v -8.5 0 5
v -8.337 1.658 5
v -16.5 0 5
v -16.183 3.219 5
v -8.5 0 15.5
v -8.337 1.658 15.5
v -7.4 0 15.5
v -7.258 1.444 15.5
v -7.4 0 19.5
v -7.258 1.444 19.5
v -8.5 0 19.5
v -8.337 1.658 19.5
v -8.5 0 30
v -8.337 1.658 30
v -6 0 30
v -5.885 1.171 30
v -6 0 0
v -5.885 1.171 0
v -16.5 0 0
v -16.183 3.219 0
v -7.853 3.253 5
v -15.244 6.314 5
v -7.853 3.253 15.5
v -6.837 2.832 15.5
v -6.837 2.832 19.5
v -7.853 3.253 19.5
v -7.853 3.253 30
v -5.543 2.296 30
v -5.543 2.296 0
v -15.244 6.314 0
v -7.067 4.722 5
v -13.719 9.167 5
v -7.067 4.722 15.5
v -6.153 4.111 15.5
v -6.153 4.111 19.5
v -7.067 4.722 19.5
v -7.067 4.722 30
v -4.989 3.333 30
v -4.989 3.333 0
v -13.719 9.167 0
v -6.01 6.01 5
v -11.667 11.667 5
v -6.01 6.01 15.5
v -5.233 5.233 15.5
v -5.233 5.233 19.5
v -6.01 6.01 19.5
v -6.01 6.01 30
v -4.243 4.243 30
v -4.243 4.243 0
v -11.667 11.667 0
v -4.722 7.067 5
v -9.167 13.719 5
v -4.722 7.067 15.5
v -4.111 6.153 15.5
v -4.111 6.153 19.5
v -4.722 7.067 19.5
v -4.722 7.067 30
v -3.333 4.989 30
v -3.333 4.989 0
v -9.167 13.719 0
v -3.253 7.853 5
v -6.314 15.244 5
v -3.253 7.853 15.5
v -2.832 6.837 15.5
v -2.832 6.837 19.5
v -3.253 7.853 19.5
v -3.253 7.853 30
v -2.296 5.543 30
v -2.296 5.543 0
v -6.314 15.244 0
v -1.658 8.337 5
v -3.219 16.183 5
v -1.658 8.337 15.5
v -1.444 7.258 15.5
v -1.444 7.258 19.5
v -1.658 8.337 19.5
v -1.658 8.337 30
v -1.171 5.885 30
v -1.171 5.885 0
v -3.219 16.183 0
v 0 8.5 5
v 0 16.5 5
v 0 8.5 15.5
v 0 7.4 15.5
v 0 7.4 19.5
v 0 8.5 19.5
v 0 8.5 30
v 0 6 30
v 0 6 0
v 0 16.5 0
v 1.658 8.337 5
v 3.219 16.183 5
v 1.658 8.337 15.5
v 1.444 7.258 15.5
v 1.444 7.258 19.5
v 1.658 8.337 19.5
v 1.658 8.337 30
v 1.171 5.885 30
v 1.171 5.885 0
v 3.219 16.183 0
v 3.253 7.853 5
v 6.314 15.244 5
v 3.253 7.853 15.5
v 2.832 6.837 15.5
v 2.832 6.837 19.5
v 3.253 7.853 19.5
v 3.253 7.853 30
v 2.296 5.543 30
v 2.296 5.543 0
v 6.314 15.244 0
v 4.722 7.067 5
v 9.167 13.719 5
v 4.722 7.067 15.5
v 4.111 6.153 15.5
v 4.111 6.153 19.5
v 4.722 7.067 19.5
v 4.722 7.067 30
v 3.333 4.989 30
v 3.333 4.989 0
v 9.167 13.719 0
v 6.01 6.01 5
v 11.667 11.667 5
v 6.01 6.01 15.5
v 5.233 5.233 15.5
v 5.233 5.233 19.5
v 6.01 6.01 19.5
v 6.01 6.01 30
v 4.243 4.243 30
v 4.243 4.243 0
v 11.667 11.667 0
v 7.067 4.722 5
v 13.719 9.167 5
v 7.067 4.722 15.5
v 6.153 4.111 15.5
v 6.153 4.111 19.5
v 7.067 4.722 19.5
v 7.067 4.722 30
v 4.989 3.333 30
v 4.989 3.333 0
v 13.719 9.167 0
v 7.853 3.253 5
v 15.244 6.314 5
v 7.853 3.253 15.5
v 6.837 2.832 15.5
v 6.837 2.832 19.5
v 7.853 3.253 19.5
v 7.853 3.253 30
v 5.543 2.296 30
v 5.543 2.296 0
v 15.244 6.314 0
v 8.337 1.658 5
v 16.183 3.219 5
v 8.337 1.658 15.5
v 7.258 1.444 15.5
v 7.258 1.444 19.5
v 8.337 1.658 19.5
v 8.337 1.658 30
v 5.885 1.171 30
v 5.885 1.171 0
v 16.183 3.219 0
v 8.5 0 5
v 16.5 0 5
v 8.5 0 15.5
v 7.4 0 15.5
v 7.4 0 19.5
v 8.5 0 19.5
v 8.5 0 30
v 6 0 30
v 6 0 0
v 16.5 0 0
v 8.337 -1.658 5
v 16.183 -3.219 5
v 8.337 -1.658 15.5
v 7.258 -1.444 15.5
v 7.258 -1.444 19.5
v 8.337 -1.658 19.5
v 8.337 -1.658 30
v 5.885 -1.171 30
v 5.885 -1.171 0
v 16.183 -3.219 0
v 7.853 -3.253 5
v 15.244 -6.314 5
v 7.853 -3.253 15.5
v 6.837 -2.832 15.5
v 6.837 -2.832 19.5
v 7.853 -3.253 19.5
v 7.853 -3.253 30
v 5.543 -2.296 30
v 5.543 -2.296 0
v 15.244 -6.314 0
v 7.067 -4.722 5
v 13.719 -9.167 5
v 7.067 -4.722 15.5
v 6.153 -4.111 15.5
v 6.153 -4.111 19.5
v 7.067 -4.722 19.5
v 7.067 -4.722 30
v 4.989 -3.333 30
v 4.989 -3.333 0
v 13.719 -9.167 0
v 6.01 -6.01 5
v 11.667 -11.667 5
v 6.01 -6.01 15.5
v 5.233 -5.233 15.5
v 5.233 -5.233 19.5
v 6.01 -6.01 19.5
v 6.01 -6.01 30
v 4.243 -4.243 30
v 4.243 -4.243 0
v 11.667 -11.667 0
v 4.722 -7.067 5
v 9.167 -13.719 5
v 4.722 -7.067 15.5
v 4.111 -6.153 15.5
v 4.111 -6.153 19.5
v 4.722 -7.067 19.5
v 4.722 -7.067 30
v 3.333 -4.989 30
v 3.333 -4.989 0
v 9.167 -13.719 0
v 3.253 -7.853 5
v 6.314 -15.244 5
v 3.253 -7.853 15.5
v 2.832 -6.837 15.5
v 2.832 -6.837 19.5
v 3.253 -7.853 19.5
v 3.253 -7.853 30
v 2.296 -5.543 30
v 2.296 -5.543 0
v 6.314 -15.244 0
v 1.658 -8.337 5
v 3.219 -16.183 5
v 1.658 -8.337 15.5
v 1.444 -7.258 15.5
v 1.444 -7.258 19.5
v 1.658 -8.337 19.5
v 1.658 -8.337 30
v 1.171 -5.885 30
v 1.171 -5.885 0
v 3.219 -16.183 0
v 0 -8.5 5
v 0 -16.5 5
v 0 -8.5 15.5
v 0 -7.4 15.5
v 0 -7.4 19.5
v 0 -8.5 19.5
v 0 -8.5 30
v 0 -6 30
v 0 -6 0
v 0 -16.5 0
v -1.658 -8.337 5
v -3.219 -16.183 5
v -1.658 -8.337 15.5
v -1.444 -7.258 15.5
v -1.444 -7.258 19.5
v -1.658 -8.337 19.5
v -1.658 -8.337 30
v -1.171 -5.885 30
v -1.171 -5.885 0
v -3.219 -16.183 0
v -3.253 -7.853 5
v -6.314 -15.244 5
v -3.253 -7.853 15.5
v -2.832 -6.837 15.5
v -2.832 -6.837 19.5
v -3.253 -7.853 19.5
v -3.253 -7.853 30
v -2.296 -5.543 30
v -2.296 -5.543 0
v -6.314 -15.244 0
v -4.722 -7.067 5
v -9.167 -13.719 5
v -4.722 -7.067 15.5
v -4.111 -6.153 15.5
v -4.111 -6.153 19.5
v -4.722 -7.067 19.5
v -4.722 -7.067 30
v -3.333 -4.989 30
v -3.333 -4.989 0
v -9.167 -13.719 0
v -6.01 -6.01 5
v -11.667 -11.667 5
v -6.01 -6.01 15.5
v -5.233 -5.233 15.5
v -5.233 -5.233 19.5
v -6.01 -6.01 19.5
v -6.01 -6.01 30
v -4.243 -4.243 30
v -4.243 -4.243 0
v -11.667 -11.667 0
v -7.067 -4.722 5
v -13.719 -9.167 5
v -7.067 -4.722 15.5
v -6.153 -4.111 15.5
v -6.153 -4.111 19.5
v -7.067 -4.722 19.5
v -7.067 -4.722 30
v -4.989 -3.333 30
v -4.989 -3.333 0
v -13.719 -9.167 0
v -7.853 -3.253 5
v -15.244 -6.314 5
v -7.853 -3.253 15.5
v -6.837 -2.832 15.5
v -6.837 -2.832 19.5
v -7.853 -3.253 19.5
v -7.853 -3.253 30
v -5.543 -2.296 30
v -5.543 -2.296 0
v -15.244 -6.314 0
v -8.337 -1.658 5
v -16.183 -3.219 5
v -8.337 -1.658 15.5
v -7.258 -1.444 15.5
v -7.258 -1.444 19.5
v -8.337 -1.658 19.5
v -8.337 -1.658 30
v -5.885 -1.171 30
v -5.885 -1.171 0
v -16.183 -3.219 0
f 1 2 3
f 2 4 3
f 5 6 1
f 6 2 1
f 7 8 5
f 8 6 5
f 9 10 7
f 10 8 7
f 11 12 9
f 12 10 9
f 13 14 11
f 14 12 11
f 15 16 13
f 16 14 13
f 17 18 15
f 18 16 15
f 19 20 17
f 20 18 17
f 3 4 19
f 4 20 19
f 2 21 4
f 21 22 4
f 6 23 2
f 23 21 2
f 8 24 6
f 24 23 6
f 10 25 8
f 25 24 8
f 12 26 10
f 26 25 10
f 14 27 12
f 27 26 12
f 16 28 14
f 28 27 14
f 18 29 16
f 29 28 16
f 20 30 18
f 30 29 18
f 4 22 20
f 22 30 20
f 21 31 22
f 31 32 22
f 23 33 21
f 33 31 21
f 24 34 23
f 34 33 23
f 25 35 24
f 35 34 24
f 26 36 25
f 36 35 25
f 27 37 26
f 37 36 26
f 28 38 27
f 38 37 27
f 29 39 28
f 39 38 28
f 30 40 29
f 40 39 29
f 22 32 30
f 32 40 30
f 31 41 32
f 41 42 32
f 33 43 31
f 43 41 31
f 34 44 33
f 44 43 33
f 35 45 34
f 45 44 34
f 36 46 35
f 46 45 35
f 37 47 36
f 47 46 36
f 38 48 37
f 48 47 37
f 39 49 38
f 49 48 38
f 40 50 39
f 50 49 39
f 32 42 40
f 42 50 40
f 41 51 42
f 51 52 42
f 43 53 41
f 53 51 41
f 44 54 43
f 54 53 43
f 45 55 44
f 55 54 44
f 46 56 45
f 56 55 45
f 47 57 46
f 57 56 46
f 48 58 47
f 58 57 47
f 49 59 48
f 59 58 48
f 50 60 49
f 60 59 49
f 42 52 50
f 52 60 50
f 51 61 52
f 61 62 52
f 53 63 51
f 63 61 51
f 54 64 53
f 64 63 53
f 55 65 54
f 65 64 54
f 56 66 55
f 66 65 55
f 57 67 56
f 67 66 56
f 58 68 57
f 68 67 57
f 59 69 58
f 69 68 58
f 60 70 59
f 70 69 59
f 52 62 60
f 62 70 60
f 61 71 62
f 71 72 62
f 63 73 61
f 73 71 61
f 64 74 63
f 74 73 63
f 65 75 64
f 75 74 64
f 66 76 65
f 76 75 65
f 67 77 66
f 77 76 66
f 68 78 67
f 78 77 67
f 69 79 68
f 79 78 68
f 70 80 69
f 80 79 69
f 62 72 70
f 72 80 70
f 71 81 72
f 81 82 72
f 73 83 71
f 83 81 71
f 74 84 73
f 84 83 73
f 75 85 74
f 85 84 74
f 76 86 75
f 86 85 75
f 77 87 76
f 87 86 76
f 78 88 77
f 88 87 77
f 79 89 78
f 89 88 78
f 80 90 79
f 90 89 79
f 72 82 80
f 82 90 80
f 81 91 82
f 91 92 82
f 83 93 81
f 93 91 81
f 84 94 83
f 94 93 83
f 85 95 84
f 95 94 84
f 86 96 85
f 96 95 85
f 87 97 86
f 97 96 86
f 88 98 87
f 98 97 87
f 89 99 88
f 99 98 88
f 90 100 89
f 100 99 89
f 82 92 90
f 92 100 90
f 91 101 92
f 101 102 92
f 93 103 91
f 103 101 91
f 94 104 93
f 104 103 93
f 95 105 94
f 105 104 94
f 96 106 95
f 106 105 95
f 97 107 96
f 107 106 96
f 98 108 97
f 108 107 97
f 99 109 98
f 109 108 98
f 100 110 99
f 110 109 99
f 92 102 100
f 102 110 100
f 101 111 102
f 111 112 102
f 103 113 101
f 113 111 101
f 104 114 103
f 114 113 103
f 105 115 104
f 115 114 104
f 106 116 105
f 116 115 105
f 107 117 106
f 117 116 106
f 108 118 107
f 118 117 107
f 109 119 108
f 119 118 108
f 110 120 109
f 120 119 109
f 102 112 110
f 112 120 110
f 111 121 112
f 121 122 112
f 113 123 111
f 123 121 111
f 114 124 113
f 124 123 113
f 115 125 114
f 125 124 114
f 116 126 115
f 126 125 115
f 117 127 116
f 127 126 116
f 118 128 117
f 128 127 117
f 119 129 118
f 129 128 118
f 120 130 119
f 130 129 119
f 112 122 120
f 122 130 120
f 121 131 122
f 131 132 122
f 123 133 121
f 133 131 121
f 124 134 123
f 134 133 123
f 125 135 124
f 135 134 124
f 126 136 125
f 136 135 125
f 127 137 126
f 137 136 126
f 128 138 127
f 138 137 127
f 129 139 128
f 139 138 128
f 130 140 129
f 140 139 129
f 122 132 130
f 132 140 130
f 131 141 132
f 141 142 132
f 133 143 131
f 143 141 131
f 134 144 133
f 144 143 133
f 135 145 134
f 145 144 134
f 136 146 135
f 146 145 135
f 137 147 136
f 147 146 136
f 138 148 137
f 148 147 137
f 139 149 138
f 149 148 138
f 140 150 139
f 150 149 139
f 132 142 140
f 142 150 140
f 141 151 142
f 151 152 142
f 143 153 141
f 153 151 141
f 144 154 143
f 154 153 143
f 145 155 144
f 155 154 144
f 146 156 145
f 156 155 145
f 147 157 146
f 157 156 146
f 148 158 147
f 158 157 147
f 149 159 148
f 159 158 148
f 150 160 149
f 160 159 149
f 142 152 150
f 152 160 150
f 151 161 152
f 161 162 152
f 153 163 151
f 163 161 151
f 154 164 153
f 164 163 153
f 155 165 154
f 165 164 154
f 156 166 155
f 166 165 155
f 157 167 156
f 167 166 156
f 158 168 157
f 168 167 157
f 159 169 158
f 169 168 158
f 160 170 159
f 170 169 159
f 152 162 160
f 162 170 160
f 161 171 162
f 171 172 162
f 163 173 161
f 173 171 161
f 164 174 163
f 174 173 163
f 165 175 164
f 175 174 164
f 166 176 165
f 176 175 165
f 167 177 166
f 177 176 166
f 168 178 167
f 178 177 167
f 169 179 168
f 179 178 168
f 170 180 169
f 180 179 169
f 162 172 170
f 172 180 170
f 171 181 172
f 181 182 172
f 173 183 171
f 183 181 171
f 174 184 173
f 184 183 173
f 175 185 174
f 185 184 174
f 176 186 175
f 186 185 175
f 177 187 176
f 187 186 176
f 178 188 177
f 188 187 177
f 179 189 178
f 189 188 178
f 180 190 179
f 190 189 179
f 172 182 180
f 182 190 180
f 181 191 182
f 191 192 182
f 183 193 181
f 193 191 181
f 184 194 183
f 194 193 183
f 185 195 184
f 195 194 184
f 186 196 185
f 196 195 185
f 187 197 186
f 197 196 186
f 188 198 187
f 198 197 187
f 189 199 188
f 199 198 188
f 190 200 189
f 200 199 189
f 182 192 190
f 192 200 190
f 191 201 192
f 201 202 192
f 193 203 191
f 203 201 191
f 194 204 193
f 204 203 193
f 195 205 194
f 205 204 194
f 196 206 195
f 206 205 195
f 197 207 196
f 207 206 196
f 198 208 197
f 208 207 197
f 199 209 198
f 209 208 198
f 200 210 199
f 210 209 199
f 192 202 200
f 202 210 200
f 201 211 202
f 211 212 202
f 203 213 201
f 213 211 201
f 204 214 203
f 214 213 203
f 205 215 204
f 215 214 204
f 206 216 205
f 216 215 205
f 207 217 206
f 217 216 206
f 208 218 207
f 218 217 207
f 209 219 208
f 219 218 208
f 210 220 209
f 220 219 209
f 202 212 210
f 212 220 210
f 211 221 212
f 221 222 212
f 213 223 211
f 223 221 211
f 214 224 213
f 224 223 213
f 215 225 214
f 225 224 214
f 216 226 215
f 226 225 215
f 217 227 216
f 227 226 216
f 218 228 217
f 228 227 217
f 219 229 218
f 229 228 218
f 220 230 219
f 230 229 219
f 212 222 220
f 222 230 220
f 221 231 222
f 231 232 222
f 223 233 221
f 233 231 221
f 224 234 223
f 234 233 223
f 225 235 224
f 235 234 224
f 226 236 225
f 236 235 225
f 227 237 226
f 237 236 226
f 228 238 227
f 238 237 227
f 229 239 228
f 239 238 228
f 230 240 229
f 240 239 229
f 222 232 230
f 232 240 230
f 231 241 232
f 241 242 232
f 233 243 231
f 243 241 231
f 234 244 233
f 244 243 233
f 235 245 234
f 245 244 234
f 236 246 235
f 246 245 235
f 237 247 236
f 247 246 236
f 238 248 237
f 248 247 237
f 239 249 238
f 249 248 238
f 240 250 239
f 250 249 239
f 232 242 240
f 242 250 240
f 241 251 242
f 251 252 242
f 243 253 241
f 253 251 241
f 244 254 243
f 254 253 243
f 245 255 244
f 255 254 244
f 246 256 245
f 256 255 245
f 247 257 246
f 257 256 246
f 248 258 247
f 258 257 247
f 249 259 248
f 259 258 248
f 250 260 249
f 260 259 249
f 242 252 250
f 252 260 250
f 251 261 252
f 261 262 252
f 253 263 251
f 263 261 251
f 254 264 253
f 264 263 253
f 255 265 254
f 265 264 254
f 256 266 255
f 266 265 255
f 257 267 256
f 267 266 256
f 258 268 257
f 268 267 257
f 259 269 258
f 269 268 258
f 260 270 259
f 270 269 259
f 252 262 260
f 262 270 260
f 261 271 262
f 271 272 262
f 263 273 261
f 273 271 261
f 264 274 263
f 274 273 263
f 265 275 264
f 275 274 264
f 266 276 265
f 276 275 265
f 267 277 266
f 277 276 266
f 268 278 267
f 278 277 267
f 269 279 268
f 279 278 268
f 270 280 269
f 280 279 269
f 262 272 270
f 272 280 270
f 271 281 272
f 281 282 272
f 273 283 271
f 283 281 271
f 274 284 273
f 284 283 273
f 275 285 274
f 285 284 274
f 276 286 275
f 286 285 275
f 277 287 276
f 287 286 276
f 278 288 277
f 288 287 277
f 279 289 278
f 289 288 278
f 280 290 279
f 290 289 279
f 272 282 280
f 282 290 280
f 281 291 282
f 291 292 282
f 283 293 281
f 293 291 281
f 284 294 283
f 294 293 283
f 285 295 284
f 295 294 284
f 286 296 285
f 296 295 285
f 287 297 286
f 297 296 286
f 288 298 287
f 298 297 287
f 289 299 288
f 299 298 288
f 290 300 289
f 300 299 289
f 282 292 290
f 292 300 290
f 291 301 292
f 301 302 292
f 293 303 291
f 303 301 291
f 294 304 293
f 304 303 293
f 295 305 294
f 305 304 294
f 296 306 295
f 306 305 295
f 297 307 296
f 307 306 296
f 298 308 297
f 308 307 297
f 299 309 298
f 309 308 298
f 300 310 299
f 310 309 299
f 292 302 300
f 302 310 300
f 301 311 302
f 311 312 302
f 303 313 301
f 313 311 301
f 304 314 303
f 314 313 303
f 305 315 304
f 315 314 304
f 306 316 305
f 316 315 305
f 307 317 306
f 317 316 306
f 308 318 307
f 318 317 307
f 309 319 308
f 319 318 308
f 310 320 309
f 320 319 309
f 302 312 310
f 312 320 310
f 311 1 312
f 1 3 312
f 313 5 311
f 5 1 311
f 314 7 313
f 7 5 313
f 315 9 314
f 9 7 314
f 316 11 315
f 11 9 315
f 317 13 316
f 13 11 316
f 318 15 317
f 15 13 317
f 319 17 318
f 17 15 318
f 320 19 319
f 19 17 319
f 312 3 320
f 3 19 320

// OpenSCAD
$fn = 32;

// ----------------------------------------------------------------------
// Grooved revolve: flanged, bore R6
// ----------------------------------------------------------------------

// --- parameters (mm) ---
bore_r = 6;               // bore radius
outer_r = 8.5;            // outer radius of the body
total_h = 30;             // overall height, Z
wall = 2.5;               // radial wall thickness
groove_w = 4;             // groove width
groove_d = 1.1;           // groove depth
grooves = 1;              // number of outer grooves
flange_r = 16.5;          // flange radius
flange_h = 5;             // flange height

bbox_x = 2 * flange_r;  // full diameter
bore_d = 2 * bore_r;  // bore diameter
body_d = 2 * outer_r;  // body diameter
flange_d = 2 * flange_r;  // flange diameter
revolve_angle = 360;  // full turn around the Z axis

profile = [[6, 0], [8.5, 0], [16.5, 0], [16.5, 5], [8.5, 5], [8.5, 15.5], [7.4, 15.5], [7.4, 19.5], [8.5, 19.5], [8.5, 30], [6, 30]];  // primary outline, 11 points, counter clockwise

// --- the one profile operation ---
rotate_extrude(angle = revolve_angle) polygon(points = profile);
